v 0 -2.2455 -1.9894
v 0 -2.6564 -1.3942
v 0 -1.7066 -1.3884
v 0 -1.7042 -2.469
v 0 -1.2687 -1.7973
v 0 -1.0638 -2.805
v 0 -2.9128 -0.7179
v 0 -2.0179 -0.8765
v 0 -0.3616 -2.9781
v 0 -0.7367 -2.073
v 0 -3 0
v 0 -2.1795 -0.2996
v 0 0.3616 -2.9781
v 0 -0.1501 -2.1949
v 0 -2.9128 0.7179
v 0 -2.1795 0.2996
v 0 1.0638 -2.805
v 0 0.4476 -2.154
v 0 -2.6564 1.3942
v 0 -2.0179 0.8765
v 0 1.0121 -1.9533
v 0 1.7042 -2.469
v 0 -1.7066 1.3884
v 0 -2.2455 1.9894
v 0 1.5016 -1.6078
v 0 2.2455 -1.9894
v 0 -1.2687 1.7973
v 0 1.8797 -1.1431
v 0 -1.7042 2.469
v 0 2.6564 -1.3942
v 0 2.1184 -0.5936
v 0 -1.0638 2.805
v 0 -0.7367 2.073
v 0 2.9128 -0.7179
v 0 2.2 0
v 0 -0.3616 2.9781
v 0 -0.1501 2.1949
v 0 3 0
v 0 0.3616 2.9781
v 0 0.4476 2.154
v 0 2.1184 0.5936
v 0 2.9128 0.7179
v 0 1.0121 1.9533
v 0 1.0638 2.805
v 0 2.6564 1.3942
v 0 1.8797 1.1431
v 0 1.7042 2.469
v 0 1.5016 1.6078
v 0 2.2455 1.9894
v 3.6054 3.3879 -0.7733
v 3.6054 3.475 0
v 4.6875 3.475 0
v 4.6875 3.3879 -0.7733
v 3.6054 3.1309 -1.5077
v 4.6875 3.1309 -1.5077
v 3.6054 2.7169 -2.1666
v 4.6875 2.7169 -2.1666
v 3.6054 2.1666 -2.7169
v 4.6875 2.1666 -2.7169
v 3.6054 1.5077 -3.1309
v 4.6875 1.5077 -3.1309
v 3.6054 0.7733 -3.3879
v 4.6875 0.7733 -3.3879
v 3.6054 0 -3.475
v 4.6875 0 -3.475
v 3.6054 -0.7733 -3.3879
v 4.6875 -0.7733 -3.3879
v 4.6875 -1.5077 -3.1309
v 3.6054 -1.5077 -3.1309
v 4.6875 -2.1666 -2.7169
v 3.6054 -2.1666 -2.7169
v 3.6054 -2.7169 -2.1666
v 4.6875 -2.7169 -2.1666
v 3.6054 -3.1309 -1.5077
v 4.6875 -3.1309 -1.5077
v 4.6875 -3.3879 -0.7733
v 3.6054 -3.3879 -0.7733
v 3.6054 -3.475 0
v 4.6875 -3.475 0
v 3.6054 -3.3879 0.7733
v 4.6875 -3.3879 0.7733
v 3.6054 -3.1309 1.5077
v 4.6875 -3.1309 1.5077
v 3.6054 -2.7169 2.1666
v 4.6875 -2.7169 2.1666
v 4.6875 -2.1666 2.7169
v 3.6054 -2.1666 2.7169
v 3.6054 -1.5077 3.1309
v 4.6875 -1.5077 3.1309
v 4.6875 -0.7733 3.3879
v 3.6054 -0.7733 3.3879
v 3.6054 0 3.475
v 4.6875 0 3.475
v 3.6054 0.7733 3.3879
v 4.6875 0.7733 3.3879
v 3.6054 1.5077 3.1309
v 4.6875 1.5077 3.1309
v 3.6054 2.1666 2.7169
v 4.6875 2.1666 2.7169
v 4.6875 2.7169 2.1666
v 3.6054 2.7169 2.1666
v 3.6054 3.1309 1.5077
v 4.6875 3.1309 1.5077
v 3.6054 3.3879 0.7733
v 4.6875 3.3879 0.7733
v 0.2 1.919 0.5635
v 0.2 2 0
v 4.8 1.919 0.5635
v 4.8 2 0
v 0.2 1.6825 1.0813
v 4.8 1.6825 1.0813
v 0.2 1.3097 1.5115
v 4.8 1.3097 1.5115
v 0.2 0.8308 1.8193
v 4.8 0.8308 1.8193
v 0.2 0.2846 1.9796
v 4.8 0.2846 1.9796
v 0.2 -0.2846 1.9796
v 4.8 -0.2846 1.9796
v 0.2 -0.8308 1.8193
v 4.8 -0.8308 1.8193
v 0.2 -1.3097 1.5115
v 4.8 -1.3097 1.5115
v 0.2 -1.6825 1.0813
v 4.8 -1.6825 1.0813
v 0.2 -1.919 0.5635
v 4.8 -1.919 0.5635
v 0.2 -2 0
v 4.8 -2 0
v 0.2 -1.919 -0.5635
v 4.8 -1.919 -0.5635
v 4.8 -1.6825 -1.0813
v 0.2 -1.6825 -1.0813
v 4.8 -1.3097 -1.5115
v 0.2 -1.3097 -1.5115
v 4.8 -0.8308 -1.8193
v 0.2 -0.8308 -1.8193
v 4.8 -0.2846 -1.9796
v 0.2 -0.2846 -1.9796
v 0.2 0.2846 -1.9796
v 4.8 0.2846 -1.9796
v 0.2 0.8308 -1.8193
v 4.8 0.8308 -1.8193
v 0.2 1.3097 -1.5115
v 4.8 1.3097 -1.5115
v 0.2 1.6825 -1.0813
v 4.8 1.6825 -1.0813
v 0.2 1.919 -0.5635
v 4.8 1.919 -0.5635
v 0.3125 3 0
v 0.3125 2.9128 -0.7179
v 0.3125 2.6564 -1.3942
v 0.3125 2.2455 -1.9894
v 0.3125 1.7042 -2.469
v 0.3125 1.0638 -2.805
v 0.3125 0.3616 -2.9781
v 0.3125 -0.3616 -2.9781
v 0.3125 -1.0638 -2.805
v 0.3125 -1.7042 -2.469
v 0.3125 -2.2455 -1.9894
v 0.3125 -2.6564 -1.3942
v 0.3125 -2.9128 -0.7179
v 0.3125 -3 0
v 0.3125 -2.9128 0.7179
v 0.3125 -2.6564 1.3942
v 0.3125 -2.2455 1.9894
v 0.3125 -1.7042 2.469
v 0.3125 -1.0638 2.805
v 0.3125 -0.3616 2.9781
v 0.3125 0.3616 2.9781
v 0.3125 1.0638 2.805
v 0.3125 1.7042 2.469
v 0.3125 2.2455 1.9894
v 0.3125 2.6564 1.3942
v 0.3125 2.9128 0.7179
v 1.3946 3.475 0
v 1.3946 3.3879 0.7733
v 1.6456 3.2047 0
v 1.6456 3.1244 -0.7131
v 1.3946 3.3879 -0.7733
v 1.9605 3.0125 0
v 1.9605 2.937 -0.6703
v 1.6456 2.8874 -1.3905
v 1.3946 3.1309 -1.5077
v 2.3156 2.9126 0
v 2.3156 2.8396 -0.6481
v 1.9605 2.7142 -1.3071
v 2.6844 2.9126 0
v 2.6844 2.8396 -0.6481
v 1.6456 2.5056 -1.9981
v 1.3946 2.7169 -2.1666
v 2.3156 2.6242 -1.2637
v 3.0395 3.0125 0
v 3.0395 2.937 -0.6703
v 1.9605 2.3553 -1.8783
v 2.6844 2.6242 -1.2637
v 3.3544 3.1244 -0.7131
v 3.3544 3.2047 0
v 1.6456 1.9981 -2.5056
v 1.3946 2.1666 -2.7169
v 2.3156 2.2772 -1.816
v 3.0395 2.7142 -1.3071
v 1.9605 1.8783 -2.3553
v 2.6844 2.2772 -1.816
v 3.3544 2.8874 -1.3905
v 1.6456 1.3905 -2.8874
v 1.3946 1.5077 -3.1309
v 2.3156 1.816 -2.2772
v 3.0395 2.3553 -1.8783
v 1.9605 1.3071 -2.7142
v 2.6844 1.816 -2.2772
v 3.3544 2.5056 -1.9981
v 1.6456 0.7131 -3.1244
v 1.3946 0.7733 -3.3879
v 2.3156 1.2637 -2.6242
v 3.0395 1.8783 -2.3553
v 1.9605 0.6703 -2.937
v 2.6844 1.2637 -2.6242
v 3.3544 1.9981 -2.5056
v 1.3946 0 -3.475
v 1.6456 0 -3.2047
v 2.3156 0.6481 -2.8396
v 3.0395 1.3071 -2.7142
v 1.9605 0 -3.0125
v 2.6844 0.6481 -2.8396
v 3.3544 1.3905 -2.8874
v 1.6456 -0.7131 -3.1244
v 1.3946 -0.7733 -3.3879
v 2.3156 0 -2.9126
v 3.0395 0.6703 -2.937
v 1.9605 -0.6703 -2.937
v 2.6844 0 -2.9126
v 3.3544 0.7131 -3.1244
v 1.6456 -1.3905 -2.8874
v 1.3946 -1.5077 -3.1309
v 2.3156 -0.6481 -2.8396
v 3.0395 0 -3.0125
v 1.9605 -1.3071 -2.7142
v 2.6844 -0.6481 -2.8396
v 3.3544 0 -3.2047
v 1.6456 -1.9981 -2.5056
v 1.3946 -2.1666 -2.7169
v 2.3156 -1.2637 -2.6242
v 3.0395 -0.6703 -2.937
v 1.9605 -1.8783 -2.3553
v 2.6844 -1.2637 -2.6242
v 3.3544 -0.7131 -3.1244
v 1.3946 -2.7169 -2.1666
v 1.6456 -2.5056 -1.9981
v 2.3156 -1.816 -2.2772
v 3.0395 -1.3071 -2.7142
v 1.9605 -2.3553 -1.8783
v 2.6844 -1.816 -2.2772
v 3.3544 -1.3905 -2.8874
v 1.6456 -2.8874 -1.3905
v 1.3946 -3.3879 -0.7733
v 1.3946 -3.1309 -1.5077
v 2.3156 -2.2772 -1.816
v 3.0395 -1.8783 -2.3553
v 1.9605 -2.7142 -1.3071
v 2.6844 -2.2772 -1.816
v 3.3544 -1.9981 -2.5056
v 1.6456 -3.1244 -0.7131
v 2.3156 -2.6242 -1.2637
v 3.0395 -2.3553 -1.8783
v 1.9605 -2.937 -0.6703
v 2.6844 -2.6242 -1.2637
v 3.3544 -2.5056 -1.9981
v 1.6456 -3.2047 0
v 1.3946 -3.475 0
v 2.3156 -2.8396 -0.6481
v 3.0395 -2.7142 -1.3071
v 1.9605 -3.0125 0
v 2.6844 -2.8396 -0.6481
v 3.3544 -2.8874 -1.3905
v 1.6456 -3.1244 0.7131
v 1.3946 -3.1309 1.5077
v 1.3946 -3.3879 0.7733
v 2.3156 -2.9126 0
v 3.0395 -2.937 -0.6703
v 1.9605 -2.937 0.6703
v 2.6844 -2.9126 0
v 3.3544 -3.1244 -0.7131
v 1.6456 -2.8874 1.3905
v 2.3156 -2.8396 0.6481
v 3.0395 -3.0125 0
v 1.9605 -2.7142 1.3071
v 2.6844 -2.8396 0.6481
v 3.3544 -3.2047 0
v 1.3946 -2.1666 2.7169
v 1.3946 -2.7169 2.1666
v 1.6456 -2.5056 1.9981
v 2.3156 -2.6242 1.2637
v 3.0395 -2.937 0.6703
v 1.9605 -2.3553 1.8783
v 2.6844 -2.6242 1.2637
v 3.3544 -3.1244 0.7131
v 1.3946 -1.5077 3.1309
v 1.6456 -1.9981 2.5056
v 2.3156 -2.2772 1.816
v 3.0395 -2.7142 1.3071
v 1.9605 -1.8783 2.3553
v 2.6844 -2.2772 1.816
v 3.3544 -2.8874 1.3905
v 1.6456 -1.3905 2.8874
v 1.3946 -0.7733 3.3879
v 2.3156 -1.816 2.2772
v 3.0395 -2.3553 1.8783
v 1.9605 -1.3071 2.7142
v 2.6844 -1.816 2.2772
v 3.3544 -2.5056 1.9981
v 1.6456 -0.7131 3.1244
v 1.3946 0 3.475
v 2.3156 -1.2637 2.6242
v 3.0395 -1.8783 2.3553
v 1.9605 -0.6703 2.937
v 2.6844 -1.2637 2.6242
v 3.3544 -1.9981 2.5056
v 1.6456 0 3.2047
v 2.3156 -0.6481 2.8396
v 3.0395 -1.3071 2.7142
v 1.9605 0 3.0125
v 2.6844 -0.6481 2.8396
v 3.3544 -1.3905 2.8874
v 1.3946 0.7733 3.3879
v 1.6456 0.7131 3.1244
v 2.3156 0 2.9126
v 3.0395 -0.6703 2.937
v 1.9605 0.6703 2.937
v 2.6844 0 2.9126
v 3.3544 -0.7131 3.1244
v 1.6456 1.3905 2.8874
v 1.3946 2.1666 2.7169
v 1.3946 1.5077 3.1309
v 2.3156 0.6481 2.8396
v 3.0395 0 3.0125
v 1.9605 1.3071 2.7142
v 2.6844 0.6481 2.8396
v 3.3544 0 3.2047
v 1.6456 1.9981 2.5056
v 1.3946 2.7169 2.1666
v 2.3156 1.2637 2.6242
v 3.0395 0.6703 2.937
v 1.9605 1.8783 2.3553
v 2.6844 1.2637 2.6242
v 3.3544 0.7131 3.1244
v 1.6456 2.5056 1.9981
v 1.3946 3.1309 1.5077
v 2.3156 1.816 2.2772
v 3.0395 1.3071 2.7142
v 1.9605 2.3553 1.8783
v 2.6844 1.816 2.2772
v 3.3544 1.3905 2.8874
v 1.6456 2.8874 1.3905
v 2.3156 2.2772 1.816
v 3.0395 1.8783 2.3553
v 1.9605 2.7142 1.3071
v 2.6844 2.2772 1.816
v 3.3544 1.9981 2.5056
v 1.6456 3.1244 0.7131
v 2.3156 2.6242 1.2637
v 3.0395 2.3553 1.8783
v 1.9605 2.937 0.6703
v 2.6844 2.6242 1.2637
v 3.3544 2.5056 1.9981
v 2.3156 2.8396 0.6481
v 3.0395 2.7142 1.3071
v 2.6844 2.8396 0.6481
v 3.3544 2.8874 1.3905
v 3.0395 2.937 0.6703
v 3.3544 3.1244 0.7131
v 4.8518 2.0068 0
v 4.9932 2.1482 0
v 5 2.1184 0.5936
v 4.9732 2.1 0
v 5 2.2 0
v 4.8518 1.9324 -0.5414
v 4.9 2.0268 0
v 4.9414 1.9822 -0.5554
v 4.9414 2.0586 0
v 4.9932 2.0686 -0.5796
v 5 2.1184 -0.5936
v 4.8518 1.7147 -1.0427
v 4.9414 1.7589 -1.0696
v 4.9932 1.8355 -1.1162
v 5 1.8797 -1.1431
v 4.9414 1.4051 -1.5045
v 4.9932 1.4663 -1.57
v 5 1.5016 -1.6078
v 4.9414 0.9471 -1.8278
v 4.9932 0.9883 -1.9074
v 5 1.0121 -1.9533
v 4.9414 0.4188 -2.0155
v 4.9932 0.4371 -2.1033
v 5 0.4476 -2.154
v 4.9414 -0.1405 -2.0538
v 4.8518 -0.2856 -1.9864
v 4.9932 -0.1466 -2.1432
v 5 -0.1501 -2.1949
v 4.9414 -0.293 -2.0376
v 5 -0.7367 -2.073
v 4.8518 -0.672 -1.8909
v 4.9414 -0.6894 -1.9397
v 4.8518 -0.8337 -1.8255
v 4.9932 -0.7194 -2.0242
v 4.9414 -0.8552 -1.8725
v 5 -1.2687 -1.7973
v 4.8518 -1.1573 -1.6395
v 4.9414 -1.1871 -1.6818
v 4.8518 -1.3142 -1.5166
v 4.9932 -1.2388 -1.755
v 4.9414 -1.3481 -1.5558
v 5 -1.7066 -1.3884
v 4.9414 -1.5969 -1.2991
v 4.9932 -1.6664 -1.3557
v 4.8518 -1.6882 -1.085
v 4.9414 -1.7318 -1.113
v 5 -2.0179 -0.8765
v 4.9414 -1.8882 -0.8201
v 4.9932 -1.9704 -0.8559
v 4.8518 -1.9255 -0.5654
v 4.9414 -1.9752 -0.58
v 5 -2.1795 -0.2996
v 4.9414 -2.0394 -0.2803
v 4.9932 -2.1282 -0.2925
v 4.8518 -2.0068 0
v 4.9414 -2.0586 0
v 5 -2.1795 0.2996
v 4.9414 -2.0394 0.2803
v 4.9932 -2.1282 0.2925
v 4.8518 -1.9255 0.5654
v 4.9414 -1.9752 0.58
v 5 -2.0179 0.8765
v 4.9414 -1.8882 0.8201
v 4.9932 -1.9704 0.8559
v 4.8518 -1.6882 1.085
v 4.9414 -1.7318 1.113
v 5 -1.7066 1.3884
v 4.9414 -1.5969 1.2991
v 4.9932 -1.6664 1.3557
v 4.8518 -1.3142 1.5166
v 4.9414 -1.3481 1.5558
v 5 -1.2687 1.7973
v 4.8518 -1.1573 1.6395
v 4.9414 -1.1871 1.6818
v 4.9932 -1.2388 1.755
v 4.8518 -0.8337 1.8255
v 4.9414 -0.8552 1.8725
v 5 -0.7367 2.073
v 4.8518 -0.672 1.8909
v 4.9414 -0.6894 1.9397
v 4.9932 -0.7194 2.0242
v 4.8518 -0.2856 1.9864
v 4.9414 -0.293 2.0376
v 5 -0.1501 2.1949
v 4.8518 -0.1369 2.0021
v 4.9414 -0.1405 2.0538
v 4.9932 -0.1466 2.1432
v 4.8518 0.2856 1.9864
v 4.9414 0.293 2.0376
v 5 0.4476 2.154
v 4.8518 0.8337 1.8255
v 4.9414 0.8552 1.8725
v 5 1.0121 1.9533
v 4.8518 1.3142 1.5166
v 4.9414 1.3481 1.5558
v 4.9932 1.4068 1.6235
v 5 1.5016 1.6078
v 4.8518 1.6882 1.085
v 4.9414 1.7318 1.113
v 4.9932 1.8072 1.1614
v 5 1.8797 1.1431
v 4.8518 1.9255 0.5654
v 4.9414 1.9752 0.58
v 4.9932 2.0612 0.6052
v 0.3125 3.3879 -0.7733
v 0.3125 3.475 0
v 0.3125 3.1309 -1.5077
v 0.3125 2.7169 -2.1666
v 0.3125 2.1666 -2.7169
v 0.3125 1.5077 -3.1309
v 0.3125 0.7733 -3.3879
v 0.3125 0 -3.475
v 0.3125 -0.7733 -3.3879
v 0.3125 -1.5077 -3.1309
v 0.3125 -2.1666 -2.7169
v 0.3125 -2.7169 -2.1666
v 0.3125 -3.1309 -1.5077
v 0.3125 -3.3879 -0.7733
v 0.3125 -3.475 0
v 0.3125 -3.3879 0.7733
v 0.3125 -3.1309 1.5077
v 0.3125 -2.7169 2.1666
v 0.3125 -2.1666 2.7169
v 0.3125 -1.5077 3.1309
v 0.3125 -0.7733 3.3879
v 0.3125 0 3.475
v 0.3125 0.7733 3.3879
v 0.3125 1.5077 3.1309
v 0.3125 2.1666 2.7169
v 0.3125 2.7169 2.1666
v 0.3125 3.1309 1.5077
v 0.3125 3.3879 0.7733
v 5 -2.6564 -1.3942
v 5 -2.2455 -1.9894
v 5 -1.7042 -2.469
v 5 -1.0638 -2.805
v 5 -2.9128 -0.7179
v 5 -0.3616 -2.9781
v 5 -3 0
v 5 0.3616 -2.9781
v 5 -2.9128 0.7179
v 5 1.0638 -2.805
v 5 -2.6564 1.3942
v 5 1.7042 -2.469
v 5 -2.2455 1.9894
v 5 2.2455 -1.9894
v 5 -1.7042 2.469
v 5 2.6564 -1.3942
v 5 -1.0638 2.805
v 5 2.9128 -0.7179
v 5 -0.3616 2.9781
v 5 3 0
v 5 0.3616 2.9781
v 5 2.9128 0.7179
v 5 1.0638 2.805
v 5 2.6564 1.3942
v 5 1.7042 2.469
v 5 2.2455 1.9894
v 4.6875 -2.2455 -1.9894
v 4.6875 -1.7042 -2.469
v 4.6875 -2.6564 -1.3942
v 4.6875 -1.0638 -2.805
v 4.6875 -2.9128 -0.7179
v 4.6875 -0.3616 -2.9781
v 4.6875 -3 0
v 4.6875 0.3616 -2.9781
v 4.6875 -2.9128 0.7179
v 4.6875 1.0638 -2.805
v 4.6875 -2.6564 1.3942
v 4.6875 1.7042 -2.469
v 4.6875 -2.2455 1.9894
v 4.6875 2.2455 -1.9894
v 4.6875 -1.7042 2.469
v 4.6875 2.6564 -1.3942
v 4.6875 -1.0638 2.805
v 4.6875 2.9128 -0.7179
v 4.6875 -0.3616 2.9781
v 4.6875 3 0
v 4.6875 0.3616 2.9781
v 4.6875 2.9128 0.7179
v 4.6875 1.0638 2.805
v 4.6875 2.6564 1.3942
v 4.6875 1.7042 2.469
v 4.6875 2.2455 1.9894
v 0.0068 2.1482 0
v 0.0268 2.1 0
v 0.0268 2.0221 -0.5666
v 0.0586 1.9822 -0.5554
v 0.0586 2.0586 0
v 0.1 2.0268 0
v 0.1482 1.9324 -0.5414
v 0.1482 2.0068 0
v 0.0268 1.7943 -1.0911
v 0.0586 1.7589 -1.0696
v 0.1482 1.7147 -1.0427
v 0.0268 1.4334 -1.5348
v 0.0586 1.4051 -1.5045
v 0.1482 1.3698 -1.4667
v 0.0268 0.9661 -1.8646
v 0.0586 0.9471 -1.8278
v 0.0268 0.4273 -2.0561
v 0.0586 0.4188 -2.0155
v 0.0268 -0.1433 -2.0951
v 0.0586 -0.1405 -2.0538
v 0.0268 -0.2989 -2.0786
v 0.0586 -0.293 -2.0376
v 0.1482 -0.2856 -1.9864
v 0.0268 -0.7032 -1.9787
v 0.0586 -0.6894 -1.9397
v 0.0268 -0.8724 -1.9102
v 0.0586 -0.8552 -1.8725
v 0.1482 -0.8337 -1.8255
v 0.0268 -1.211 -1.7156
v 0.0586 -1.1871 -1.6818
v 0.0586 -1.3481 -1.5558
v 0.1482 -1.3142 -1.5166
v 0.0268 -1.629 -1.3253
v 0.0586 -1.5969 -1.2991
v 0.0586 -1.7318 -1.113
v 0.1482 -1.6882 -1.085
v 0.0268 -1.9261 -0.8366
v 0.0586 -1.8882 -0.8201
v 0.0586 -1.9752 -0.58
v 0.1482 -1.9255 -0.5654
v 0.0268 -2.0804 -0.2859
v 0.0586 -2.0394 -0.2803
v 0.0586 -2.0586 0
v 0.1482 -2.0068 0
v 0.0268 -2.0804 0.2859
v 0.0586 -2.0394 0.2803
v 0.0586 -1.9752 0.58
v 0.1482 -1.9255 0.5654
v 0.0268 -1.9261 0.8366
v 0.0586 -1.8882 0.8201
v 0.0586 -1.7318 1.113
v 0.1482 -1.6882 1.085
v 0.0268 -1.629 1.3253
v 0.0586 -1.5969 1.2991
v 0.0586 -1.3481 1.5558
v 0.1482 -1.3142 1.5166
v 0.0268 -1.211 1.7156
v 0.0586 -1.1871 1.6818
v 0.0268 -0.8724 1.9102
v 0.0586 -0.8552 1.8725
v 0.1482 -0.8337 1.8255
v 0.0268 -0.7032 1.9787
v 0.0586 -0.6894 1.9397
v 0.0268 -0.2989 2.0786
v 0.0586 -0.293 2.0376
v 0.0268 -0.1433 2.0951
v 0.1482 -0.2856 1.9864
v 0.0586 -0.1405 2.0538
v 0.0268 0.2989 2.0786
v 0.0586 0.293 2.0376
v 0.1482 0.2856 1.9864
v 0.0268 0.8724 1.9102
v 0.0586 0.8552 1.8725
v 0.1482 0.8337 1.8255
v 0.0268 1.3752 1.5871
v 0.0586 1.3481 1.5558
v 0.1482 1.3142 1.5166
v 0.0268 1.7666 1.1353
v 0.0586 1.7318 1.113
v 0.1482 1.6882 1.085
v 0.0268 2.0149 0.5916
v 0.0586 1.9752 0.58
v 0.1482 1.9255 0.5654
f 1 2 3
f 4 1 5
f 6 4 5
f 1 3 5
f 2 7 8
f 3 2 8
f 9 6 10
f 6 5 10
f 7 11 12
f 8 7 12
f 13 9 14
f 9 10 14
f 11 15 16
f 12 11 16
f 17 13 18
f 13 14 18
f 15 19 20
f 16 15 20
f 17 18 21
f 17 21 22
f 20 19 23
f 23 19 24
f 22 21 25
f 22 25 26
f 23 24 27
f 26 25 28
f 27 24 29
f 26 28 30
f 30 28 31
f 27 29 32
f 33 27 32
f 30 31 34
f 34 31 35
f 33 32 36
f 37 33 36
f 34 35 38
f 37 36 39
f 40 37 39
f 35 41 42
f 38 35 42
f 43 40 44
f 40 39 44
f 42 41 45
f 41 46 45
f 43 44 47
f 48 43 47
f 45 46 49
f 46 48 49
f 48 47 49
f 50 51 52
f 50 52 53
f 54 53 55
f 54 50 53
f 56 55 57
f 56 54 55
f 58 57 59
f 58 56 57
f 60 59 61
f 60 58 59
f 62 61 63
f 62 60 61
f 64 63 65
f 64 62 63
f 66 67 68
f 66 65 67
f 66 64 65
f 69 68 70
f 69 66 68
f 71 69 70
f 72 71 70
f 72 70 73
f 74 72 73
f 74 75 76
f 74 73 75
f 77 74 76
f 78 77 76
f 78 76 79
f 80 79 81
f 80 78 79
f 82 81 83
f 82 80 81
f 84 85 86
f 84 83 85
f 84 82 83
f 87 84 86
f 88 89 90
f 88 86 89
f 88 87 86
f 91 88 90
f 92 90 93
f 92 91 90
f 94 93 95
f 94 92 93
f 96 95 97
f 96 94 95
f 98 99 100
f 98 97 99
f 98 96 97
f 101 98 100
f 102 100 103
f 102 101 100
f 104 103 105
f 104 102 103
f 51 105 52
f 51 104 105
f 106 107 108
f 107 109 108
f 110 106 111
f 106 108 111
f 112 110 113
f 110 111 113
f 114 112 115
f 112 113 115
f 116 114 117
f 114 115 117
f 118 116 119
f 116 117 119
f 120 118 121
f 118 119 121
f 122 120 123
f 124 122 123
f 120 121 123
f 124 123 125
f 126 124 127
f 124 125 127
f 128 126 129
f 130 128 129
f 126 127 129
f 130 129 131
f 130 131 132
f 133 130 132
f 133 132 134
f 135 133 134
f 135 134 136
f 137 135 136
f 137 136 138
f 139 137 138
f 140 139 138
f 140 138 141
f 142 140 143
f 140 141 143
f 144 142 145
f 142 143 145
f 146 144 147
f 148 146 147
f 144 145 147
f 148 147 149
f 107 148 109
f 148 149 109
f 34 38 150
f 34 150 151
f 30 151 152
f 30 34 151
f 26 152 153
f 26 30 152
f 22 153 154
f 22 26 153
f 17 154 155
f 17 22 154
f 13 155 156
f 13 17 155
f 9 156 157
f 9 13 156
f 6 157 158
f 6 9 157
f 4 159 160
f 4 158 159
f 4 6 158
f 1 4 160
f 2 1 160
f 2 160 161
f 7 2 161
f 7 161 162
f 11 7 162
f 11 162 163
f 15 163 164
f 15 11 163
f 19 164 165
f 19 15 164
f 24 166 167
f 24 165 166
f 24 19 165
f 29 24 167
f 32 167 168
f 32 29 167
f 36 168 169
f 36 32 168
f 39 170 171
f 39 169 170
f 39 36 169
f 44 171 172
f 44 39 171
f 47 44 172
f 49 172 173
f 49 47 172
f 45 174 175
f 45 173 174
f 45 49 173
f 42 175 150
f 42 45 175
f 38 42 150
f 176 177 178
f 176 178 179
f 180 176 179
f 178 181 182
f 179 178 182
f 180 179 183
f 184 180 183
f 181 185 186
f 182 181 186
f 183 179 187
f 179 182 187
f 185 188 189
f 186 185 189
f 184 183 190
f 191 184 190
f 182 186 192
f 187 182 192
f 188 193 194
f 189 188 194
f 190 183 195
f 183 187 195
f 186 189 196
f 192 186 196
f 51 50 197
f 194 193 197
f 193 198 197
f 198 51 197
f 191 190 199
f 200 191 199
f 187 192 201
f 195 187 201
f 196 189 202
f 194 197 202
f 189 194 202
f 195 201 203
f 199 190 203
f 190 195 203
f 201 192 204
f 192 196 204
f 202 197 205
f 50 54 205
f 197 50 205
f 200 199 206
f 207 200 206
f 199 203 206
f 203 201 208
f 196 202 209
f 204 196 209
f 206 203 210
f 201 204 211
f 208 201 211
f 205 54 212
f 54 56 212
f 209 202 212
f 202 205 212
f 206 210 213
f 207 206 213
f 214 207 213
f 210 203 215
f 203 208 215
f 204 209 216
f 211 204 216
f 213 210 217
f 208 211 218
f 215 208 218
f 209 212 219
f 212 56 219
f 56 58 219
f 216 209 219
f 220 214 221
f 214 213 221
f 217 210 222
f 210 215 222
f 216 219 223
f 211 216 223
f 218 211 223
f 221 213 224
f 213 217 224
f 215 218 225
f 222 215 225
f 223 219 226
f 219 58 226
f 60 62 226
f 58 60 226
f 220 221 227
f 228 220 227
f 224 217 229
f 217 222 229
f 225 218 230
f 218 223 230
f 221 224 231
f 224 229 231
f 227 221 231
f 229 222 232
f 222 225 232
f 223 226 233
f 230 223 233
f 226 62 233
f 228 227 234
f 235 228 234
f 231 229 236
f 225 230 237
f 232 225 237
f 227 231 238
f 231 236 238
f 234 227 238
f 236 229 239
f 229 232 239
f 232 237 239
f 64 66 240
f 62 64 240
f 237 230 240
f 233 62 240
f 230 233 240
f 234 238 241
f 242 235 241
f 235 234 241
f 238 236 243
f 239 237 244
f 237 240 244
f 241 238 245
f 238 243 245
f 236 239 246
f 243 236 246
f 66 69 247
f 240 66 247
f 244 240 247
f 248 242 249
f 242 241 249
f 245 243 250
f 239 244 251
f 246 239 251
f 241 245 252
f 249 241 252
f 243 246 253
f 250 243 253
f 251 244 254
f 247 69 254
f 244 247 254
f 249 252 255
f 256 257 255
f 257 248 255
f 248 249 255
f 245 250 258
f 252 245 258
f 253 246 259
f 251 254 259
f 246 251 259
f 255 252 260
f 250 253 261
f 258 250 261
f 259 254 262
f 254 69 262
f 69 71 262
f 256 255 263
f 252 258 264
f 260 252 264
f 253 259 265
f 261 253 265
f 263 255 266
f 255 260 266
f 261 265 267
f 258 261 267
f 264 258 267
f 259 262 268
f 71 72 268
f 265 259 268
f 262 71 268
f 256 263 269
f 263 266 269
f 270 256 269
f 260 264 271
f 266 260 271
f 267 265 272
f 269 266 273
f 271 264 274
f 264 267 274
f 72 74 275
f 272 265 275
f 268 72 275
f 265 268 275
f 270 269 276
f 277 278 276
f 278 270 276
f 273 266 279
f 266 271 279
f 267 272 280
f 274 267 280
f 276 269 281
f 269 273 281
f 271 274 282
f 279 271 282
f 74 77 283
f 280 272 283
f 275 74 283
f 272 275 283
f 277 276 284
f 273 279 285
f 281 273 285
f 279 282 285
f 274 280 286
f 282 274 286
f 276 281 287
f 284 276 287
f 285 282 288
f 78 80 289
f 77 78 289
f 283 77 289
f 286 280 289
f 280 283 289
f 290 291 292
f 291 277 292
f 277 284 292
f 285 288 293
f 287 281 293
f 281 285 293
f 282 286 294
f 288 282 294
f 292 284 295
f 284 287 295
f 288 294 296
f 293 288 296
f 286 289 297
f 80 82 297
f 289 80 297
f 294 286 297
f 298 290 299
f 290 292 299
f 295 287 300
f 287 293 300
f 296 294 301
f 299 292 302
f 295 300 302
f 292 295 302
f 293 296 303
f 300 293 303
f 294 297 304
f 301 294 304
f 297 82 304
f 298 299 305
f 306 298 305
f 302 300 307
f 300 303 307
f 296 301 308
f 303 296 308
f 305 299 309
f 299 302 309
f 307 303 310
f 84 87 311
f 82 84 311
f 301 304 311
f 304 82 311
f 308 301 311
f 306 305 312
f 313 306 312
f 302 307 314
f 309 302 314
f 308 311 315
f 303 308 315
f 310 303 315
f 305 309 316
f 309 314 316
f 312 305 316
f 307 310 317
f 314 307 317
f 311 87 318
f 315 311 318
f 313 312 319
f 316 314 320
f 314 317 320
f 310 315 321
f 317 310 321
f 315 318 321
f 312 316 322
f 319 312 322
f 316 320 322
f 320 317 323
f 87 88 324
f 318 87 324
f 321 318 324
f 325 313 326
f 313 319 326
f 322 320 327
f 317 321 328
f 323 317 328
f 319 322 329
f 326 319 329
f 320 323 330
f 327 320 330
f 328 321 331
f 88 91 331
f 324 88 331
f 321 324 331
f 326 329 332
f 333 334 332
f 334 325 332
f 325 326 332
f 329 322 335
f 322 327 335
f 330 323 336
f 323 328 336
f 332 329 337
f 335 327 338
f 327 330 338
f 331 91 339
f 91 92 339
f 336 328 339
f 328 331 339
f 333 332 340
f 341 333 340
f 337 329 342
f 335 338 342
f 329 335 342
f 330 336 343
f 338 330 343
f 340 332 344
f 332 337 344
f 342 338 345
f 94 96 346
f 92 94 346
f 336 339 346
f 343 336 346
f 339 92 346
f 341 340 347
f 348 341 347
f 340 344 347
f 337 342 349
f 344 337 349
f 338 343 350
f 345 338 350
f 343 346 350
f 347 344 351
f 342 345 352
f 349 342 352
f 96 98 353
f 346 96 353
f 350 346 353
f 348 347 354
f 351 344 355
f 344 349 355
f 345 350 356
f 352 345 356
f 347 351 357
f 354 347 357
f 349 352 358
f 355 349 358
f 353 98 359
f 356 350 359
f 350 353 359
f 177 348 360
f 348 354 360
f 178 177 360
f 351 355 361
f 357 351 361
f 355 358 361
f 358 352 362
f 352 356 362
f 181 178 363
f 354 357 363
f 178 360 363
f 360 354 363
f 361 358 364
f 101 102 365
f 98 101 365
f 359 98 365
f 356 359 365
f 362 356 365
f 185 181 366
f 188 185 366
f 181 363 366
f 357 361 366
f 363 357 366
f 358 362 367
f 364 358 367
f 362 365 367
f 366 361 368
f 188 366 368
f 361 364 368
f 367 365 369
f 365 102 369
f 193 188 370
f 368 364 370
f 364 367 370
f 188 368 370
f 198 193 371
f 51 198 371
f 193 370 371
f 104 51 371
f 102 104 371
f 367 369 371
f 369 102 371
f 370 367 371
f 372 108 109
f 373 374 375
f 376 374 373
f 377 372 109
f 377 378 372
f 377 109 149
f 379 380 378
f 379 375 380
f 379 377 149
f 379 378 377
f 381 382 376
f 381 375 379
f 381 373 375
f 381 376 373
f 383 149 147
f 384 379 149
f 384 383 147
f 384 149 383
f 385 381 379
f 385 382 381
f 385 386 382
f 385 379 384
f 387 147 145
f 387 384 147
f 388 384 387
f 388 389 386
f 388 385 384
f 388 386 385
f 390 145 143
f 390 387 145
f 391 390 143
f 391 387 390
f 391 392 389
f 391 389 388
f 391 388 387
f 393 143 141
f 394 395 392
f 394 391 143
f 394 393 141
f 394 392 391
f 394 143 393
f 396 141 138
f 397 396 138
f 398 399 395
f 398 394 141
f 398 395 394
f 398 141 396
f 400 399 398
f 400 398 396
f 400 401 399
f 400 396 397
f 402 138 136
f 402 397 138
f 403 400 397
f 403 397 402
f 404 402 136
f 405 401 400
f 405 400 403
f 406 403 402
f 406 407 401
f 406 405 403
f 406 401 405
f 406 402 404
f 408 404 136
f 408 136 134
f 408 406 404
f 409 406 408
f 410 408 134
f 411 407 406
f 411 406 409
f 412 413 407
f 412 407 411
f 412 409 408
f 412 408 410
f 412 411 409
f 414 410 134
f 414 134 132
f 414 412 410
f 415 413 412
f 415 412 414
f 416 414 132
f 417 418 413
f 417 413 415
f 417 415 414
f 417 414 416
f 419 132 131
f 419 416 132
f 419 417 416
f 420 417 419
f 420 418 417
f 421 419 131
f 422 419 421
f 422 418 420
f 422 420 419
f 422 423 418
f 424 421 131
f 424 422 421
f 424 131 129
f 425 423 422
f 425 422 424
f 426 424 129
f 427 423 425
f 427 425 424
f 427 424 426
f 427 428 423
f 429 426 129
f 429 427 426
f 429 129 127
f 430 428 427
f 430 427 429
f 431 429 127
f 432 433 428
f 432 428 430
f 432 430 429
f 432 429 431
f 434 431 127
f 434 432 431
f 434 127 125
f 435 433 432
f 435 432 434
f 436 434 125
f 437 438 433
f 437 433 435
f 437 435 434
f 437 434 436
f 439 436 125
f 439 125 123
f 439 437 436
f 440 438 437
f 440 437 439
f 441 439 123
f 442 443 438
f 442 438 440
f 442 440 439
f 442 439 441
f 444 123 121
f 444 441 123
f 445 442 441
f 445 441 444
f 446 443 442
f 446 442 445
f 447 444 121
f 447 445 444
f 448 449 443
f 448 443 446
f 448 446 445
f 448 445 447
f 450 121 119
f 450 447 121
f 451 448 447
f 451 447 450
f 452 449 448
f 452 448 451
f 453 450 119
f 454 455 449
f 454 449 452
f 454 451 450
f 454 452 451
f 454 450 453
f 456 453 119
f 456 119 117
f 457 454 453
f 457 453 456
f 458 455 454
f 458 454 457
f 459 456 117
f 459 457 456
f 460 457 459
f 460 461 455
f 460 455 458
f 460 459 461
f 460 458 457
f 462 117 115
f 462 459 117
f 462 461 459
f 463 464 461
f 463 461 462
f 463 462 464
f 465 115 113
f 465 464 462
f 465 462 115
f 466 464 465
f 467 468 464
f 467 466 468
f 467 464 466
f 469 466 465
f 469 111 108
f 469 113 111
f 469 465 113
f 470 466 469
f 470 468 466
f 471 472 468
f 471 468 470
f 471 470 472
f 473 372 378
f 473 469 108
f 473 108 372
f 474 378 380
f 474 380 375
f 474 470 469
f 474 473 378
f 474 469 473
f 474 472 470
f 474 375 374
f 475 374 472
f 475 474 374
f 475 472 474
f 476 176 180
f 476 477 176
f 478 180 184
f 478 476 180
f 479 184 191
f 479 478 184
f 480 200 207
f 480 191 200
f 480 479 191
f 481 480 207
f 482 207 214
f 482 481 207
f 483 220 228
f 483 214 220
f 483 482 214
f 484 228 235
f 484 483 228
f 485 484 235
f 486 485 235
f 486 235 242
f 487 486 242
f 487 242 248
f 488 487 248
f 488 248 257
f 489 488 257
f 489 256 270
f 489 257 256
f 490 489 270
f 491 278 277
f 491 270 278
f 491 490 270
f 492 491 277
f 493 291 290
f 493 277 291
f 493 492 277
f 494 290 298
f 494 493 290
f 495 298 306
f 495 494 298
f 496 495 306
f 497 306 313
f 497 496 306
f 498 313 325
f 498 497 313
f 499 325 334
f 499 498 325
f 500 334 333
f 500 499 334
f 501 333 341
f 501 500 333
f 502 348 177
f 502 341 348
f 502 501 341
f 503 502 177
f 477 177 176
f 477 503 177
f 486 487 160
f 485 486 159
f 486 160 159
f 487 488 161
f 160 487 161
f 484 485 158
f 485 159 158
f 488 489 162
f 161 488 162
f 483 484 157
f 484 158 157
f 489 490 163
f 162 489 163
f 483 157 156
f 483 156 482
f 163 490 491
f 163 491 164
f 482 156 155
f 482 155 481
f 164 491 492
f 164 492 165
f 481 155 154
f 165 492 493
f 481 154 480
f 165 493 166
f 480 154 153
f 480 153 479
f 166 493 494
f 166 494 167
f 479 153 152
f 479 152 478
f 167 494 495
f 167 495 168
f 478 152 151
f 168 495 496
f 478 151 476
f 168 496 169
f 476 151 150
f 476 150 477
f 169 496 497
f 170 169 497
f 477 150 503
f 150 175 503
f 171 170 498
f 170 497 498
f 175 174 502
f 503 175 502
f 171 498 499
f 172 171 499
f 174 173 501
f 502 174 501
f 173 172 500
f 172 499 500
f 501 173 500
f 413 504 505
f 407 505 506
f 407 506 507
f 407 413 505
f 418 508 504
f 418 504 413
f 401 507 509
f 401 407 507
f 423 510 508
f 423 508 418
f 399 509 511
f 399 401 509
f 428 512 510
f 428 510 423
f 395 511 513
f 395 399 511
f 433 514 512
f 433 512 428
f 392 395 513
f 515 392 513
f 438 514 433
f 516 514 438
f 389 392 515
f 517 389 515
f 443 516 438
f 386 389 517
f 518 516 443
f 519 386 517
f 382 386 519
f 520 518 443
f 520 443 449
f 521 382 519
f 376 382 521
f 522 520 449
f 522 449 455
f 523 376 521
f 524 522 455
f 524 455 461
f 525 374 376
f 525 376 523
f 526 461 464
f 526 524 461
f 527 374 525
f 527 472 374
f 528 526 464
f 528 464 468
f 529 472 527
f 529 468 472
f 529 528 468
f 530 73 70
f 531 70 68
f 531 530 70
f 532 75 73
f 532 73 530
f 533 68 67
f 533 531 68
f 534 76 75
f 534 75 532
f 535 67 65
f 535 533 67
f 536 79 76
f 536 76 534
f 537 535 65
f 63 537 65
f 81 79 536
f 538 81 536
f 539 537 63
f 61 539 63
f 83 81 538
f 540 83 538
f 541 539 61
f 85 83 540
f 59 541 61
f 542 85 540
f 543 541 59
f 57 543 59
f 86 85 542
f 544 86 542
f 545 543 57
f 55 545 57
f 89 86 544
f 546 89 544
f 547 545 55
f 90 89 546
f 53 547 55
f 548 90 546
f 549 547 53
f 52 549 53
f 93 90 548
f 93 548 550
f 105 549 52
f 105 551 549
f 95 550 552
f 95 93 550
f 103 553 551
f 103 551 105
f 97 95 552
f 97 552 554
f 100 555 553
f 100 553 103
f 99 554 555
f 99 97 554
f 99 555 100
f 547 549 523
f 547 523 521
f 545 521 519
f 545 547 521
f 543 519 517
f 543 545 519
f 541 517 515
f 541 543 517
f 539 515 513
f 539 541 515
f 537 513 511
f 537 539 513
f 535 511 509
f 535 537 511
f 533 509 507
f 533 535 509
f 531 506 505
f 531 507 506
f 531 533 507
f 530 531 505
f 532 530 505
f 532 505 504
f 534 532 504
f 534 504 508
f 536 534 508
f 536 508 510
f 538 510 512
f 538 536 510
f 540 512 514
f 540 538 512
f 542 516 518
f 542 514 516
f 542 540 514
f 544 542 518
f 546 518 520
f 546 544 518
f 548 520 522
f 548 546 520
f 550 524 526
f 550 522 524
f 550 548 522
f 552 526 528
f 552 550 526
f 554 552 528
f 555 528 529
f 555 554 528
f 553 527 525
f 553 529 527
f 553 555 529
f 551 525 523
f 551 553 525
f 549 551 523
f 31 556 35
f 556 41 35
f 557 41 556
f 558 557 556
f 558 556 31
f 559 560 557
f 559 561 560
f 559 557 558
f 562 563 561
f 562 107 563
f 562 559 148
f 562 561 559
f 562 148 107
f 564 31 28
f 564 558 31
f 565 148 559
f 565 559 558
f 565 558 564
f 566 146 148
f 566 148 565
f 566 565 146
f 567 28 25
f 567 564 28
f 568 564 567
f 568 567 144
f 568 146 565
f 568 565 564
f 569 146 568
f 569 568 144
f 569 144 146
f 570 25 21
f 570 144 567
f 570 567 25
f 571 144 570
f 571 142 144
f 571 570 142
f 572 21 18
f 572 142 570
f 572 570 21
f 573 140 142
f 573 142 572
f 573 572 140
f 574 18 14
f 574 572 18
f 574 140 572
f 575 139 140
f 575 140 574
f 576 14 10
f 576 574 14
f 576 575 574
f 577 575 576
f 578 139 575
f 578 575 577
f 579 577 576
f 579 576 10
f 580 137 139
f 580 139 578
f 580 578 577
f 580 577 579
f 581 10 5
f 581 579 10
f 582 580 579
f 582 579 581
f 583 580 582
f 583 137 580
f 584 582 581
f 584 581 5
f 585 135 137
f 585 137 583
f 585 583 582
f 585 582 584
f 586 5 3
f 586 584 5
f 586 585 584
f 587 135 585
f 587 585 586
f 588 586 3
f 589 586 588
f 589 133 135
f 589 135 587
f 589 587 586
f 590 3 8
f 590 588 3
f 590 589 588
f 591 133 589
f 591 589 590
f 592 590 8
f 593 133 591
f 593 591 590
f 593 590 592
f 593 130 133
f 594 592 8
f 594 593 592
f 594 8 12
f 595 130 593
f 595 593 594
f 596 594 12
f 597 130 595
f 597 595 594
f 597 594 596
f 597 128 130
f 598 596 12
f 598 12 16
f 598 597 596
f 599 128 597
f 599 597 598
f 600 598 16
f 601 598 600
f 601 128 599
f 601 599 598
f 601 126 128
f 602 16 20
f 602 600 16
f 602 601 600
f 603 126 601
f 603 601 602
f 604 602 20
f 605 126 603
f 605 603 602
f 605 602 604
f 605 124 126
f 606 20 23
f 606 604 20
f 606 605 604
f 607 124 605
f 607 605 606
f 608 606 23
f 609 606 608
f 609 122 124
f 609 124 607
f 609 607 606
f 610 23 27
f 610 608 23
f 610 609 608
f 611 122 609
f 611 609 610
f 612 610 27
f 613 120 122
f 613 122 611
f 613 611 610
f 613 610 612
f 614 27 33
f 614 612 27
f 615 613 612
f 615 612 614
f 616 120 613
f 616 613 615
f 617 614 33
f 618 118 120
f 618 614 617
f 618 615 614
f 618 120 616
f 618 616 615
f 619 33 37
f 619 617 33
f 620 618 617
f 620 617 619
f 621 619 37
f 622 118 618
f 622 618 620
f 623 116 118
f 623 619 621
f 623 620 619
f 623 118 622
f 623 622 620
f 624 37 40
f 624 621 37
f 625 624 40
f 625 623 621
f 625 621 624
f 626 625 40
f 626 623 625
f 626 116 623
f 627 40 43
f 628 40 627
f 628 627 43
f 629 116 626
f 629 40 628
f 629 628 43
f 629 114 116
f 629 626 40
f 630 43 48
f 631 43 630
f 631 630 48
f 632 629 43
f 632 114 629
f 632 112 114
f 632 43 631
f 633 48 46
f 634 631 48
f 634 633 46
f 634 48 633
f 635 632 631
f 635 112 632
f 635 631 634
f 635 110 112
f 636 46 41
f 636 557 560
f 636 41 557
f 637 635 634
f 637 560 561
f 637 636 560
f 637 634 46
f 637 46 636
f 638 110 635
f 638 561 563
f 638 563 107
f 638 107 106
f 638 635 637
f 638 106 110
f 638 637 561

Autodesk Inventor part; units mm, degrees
sketch "Sketch_2" plane through (0, 0, 0) normal (0, 0, 1) x (1, 0, 0)
  line L0 (5, 0) -> (0, 0)
  arc A0 (0, 2.2) -> (0.2, 2) centre (0.2, 2.2) ccw
  line L1 (0.2, 2) -> (4.8, 2)
  arc A1 (4.8, 2) -> (5, 2.2) centre (4.8, 2.2) ccw
  line L2 (5, 2.2) -> (5, 3)
  line L3 (5, 3) -> (4.6875, 3)
  line L4 (4.6875, 3) -> (4.6875, 3.475)
  line L5 (4.6875, 3.475) -> (3.6054, 3.475)
  arc A2 (1.3946, 3.475) -> (3.6054, 3.475) centre (2.5, 4.25) ccw
  line L6 (1.3946, 3.475) -> (0.3125, 3.475)
  line L7 (0.3125, 3.475) -> (0.3125, 3)
  line L8 (0.3125, 3) -> (0, 3)
  line L9 (0, 3) -> (0, 2.2)
revolve "Revolution1" add sketch "Sketch_2" angle 360 about axis through (5, 0, 0) along (1, 0, 0)
ref_plane "ip_st_1_1_XY" through (2.5, 4.25, 0) normal (1, 0, 0) x (0, 0, -1)
ref_plane "ip_st_1_1_YZ" through (2.5, 4.25, 0) normal (0, 0, -1) x (0, 1, 0)
ref_plane "ip_st_1_1_ZX" through (2.5, 4.25, 0) normal (0, 1, 0) x (1, 0, 0)
ref_plane "ip_st_1_2_XY" through (2.5, 2.6498, 3.3228) normal (1, 0, 0) x (0, 0, -1)
ref_plane "ip_st_1_2_YZ" through (2.5, 2.6498, 3.3228) normal (0, 0, -1) x (0, 1, 0)
ref_plane "ip_st_1_2_ZX" through (2.5, 2.6498, 3.3228) normal (0, 1, 0) x (1, 0, 0)
ref_plane "ip_st_1_3_XY" through (2.5, -0.9457, 4.1434) normal (1, 0, 0) x (0, 0, -1)
ref_plane "ip_st_1_3_YZ" through (2.5, -0.9457, 4.1434) normal (0, 0, -1) x (0, 1, 0)
ref_plane "ip_st_1_3_ZX" through (2.5, -0.9457, 4.1434) normal (0, 1, 0) x (1, 0, 0)
ref_plane "ip_st_1_4_XY" through (2.5, -3.8291, 1.844) normal (1, 0, 0) x (0, 0, -1)
ref_plane "ip_st_1_4_YZ" through (2.5, -3.8291, 1.844) normal (0, 0, -1) x (0, 1, 0)
ref_plane "ip_st_1_4_ZX" through (2.5, -3.8291, 1.844) normal (0, 1, 0) x (1, 0, 0)
ref_plane "ip_st_1_5_XY" through (2.5, -3.8291, -1.844) normal (1, 0, 0) x (0, 0, -1)
ref_plane "ip_st_1_5_YZ" through (2.5, -3.8291, -1.844) normal (0, 0, -1) x (0, 1, 0)
ref_plane "ip_st_1_5_ZX" through (2.5, -3.8291, -1.844) normal (0, 1, 0) x (1, 0, 0)
ref_plane "ip_st_1_6_XY" through (2.5, -0.9457, -4.1434) normal (1, 0, 0) x (0, 0, -1)
ref_plane "ip_st_1_6_YZ" through (2.5, -0.9457, -4.1434) normal (0, 0, -1) x (0, 1, 0)
ref_plane "ip_st_1_6_ZX" through (2.5, -0.9457, -4.1434) normal (0, 1, 0) x (1, 0, 0)
ref_plane "ip_st_1_7_XY" through (2.5, 2.6498, -3.3228) normal (1, 0, 0) x (0, 0, -1)
ref_plane "ip_st_1_7_YZ" through (2.5, 2.6498, -3.3228) normal (0, 0, -1) x (0, 1, 0)
ref_plane "ip_st_1_7_ZX" through (2.5, 2.6498, -3.3228) normal (0, 1, 0) x (1, 0, 0)
ref_plane "ip_st_1a_XY" through (0, 0, 0) normal (1, 0, 0) x (0, 0, -1)
ref_plane "ip_st_1a_YZ" through (0, 0, 0) normal (0, 0, -1) x (0, 1, 0)
ref_plane "ip_st_1a_ZX" through (0, 0, 0) normal (0, 1, 0) x (1, 0, 0)
ref_plane "ip_st_2a_XY" through (0.3125, 0, 0) normal (1, 0, 0) x (0, 0, -1)
ref_plane "ip_st_2a_YZ" through (0.3125, 0, 0) normal (0, 0, -1) x (0, 1, 0)
ref_plane "ip_st_2a_ZX" through (0.3125, 0, 0) normal (0, 1, 0) x (1, 0, 0)
properties part number "F624ZZ Inner Ring"
